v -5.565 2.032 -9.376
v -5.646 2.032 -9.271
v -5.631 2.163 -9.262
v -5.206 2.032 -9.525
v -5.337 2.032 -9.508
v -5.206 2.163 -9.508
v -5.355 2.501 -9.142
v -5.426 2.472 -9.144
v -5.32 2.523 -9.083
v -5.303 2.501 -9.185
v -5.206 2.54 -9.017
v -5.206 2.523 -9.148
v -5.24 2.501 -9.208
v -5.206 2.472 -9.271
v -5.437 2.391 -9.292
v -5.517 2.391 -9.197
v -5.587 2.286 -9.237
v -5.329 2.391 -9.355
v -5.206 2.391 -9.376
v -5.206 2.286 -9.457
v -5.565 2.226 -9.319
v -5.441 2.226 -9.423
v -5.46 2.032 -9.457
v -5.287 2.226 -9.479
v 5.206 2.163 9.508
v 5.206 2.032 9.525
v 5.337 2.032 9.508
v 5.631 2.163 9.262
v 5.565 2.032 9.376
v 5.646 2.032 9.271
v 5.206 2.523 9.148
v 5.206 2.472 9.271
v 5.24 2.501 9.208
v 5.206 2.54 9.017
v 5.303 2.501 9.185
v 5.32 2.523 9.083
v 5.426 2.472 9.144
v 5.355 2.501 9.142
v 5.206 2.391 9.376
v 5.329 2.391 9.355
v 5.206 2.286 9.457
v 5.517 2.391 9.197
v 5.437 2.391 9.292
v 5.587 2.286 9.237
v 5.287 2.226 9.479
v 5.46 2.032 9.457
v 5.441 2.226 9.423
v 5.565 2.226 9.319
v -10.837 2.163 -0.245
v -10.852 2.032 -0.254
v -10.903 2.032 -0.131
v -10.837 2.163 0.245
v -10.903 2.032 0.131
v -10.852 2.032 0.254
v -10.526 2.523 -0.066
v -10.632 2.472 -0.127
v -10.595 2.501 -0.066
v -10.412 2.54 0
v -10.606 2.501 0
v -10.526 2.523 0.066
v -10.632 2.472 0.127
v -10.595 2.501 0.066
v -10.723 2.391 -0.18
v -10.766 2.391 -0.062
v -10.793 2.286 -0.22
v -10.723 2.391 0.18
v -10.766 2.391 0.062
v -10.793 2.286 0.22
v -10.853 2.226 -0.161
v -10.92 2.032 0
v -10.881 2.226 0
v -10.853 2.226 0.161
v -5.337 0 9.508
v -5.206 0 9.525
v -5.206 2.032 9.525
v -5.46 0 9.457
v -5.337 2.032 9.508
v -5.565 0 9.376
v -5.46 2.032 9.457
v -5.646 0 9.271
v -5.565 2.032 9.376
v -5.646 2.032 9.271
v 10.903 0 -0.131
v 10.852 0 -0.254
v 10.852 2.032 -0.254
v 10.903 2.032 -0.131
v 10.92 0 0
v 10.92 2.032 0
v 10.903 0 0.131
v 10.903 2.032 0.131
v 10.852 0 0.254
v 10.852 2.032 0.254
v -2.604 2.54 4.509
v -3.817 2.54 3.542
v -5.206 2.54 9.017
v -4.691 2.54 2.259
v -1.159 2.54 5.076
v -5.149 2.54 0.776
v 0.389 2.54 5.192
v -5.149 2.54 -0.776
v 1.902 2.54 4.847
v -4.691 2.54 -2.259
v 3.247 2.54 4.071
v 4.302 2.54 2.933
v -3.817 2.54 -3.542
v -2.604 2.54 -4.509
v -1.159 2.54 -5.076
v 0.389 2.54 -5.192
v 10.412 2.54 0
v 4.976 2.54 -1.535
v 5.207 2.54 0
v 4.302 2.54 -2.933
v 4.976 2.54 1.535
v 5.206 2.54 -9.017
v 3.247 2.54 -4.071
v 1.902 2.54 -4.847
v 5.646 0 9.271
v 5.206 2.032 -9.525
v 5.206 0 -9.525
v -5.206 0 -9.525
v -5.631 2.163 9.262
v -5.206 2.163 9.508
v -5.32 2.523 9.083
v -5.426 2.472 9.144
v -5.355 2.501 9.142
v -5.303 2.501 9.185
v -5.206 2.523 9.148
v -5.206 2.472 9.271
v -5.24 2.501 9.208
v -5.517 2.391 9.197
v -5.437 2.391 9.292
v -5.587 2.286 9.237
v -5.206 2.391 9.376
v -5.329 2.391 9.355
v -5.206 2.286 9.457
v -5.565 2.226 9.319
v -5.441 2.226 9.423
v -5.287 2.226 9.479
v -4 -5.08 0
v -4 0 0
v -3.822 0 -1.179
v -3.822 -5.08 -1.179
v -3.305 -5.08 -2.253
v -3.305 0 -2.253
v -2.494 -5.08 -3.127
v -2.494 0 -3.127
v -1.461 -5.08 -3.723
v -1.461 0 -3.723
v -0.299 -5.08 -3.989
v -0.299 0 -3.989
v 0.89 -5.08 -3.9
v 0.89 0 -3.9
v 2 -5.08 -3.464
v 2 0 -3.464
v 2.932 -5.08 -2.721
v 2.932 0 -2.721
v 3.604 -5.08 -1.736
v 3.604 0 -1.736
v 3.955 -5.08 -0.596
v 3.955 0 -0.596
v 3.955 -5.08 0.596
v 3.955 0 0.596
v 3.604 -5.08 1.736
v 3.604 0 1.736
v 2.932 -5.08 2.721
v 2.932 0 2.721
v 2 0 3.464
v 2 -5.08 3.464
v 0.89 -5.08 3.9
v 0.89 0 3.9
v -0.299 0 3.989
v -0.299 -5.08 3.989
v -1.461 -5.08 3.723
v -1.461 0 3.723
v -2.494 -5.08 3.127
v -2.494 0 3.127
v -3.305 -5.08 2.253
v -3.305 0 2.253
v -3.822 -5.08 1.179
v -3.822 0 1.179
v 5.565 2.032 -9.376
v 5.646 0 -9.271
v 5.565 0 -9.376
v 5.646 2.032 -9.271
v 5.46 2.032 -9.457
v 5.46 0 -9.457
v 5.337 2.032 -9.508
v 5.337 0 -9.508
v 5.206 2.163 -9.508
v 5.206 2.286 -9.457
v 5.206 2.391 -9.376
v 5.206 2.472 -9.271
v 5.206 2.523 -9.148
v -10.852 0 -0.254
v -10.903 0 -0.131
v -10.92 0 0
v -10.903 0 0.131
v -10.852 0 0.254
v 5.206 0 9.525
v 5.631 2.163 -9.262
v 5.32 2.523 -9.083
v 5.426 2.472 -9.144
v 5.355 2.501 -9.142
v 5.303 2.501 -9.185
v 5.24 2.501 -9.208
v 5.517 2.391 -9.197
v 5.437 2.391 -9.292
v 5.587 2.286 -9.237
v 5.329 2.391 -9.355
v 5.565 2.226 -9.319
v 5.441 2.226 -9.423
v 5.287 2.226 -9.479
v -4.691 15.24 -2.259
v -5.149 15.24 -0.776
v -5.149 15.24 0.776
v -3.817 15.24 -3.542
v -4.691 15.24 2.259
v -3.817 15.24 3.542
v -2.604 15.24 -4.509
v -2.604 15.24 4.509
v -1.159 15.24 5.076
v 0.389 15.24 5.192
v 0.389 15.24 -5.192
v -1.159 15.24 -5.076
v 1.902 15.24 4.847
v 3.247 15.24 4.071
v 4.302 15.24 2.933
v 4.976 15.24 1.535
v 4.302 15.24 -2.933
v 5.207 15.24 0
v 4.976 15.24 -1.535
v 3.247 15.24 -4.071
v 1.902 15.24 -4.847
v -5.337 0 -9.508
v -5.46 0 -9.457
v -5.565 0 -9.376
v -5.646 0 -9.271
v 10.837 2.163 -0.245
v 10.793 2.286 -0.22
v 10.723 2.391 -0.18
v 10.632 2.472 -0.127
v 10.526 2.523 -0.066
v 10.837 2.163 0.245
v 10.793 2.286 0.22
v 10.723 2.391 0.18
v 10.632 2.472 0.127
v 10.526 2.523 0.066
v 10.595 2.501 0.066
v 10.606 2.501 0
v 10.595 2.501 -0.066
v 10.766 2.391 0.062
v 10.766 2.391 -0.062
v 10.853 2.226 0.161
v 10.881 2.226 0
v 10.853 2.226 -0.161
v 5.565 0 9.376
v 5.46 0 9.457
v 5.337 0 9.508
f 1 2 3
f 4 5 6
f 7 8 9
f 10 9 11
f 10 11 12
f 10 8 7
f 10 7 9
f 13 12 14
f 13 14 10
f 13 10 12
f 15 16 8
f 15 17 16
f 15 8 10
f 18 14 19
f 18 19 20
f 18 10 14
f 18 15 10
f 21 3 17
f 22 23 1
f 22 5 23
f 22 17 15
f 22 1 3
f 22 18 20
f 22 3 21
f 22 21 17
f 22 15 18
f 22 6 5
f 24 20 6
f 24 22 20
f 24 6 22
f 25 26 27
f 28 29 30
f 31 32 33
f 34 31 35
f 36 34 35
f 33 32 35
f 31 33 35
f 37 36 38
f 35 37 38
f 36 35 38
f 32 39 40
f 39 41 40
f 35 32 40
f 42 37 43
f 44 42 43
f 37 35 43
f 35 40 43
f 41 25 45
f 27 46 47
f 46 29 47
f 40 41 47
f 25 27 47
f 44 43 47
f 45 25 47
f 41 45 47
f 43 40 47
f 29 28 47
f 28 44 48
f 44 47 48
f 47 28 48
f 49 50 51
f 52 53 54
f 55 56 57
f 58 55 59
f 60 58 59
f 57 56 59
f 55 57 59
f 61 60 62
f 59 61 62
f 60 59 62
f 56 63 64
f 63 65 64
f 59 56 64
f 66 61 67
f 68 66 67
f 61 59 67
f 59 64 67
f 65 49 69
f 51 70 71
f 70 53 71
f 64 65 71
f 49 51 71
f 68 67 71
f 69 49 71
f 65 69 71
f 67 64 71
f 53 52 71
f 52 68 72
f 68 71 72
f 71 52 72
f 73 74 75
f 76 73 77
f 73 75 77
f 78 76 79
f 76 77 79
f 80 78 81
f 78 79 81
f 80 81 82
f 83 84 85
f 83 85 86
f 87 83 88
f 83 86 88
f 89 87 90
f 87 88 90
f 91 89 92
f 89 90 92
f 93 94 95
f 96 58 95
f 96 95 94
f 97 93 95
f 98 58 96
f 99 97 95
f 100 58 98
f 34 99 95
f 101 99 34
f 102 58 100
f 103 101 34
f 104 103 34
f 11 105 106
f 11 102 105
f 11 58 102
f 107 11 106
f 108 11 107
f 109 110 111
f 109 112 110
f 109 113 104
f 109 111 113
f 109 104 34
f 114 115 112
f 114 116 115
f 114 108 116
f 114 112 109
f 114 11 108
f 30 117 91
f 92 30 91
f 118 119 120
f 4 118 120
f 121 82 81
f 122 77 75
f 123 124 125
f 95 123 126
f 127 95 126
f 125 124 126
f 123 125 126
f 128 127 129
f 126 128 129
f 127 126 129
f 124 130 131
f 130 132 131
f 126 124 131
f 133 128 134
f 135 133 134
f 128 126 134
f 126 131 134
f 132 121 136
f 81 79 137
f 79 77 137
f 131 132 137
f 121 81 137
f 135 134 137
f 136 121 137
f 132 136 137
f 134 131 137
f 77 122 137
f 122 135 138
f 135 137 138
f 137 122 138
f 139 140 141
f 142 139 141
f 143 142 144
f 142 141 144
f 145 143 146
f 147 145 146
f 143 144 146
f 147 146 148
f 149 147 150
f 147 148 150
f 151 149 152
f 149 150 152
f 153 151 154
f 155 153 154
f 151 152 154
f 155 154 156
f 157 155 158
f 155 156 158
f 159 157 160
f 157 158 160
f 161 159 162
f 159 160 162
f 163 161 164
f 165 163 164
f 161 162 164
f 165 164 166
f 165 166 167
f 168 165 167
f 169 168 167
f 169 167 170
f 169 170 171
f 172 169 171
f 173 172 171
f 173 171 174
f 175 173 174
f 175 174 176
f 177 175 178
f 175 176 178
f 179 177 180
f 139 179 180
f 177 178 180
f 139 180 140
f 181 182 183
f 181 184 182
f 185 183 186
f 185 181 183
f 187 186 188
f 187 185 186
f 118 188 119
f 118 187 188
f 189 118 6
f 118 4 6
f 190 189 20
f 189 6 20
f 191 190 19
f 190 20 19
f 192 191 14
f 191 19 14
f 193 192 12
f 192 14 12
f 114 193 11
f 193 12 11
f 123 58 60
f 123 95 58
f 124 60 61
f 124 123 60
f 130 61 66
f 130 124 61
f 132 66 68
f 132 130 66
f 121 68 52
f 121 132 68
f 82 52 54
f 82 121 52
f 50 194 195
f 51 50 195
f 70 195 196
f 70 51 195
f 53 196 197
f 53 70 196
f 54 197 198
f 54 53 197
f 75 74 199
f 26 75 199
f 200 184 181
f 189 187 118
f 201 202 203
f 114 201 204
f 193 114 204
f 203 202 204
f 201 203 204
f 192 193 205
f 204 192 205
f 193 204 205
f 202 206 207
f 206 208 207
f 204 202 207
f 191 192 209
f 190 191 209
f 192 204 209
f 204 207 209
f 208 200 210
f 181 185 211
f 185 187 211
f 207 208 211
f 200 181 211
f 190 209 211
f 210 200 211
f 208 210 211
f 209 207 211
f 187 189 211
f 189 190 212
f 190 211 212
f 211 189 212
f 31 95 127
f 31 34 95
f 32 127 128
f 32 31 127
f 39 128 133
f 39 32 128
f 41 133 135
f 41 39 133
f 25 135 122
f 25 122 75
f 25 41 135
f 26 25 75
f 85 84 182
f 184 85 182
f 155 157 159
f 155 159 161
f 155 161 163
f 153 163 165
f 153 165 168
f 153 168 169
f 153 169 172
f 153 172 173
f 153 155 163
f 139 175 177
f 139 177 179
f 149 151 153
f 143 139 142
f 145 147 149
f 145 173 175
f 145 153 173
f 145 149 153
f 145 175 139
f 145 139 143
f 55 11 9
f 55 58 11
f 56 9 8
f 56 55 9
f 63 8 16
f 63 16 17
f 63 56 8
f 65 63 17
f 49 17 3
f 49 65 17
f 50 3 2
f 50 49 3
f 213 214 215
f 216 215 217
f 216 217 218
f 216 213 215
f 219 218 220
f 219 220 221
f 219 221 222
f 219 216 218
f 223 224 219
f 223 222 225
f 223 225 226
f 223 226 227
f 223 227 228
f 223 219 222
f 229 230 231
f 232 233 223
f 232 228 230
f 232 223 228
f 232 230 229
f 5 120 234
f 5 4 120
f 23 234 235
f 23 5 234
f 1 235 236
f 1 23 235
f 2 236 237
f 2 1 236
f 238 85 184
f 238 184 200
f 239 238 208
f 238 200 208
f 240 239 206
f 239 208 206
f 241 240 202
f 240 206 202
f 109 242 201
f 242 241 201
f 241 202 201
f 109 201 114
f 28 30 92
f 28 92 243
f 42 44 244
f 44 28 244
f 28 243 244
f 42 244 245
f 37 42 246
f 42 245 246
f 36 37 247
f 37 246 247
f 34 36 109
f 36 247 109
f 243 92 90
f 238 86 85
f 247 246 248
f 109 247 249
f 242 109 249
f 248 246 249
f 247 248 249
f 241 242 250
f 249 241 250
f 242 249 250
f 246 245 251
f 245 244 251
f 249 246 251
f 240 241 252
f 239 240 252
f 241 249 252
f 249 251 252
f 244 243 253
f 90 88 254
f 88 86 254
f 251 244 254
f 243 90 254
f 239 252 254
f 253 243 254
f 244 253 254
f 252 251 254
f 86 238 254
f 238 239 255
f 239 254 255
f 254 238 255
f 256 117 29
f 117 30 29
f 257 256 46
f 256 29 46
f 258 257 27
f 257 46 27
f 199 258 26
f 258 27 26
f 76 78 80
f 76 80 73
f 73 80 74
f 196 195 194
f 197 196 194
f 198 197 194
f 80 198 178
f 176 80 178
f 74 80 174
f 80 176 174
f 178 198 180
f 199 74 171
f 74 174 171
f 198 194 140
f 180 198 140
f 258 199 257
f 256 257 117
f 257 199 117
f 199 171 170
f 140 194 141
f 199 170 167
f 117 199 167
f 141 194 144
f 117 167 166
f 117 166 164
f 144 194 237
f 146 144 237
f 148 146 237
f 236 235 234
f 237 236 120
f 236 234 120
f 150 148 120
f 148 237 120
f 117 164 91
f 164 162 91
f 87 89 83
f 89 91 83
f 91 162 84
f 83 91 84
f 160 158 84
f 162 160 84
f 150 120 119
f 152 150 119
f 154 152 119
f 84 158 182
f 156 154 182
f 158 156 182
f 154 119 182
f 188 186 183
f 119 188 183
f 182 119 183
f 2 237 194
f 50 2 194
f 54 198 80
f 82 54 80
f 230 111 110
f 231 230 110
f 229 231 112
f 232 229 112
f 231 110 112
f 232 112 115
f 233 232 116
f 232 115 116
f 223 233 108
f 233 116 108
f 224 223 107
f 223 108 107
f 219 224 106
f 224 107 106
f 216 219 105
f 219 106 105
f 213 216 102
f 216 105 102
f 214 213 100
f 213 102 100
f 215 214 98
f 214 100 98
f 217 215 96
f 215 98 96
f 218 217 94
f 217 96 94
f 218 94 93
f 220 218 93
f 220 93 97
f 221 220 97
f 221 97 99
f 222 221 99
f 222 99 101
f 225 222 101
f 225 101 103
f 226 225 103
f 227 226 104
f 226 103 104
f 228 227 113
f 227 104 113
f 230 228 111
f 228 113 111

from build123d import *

# Parameters (mm, degrees)
BOSS_EXTRUDE1_DEPTH = 2.54
SKETCH2_R           = 5.207
BOSS_EXTRUDE2_DEPTH = 12.7
SKETCH6_R           = 4
BOSS_EXTRUDE3_DEPTH = 5.08
FILLET1_R           = 0.508


with BuildPart() as part:
    # Sketch1 → Boss-Extrude1 (new body)
    with BuildSketch(Plane(origin=(0, 0, 0), x_dir=(1, 0, 0), z_dir=(0, 1, 0))):
        Polygon((10.998522628, 0), (5.499261314, 9.525), (-5.499261314, 9.525), (-10.998522628, 0), (-5.499261314, -9.525), (5.499261314, -9.525), align=None)
    extrude(amount=BOSS_EXTRUDE1_DEPTH)

    # Sketch2 → Boss-Extrude2 (add)
    with BuildSketch(Plane(origin=(0, 2.54, 0), x_dir=(1, 0, 0), z_dir=(0, 1, 0))):
        Circle(SKETCH2_R)
    extrude(amount=BOSS_EXTRUDE2_DEPTH)

    # Sketch6 → Boss-Extrude3 (add)
    with BuildSketch(Plane(origin=(0, 0, 0), x_dir=(-1, 0, 0), z_dir=(0, -1, 0))):
        Circle(SKETCH6_R)
    extrude(amount=BOSS_EXTRUDE3_DEPTH)

    # Fillet1
    fillet1_edges = [part.edges().sort_by_distance(p)[0] for p in [
        (0, 2.54, -9.525),
        (5.499261314, 1.27, 9.525),
        (-5.499261314, 1.27, 9.525),
        (-10.998522628, 1.27, 0),
        (-5.499261314, 1.27, -9.525),
        (5.499261314, 1.27, -9.525),
        (10.998522628, 1.27, 0),
        (-8.248891971, 2.54, -4.7625),
        (-8.248891971, 2.54, 4.7625),
        (0, 2.54, 9.525),
        (8.248891971, 2.54, 4.7625),
        (8.248891971, 2.54, -4.7625),
    ]]
    fillet(fillet1_edges, radius=FILLET1_R)


solid = part.part
